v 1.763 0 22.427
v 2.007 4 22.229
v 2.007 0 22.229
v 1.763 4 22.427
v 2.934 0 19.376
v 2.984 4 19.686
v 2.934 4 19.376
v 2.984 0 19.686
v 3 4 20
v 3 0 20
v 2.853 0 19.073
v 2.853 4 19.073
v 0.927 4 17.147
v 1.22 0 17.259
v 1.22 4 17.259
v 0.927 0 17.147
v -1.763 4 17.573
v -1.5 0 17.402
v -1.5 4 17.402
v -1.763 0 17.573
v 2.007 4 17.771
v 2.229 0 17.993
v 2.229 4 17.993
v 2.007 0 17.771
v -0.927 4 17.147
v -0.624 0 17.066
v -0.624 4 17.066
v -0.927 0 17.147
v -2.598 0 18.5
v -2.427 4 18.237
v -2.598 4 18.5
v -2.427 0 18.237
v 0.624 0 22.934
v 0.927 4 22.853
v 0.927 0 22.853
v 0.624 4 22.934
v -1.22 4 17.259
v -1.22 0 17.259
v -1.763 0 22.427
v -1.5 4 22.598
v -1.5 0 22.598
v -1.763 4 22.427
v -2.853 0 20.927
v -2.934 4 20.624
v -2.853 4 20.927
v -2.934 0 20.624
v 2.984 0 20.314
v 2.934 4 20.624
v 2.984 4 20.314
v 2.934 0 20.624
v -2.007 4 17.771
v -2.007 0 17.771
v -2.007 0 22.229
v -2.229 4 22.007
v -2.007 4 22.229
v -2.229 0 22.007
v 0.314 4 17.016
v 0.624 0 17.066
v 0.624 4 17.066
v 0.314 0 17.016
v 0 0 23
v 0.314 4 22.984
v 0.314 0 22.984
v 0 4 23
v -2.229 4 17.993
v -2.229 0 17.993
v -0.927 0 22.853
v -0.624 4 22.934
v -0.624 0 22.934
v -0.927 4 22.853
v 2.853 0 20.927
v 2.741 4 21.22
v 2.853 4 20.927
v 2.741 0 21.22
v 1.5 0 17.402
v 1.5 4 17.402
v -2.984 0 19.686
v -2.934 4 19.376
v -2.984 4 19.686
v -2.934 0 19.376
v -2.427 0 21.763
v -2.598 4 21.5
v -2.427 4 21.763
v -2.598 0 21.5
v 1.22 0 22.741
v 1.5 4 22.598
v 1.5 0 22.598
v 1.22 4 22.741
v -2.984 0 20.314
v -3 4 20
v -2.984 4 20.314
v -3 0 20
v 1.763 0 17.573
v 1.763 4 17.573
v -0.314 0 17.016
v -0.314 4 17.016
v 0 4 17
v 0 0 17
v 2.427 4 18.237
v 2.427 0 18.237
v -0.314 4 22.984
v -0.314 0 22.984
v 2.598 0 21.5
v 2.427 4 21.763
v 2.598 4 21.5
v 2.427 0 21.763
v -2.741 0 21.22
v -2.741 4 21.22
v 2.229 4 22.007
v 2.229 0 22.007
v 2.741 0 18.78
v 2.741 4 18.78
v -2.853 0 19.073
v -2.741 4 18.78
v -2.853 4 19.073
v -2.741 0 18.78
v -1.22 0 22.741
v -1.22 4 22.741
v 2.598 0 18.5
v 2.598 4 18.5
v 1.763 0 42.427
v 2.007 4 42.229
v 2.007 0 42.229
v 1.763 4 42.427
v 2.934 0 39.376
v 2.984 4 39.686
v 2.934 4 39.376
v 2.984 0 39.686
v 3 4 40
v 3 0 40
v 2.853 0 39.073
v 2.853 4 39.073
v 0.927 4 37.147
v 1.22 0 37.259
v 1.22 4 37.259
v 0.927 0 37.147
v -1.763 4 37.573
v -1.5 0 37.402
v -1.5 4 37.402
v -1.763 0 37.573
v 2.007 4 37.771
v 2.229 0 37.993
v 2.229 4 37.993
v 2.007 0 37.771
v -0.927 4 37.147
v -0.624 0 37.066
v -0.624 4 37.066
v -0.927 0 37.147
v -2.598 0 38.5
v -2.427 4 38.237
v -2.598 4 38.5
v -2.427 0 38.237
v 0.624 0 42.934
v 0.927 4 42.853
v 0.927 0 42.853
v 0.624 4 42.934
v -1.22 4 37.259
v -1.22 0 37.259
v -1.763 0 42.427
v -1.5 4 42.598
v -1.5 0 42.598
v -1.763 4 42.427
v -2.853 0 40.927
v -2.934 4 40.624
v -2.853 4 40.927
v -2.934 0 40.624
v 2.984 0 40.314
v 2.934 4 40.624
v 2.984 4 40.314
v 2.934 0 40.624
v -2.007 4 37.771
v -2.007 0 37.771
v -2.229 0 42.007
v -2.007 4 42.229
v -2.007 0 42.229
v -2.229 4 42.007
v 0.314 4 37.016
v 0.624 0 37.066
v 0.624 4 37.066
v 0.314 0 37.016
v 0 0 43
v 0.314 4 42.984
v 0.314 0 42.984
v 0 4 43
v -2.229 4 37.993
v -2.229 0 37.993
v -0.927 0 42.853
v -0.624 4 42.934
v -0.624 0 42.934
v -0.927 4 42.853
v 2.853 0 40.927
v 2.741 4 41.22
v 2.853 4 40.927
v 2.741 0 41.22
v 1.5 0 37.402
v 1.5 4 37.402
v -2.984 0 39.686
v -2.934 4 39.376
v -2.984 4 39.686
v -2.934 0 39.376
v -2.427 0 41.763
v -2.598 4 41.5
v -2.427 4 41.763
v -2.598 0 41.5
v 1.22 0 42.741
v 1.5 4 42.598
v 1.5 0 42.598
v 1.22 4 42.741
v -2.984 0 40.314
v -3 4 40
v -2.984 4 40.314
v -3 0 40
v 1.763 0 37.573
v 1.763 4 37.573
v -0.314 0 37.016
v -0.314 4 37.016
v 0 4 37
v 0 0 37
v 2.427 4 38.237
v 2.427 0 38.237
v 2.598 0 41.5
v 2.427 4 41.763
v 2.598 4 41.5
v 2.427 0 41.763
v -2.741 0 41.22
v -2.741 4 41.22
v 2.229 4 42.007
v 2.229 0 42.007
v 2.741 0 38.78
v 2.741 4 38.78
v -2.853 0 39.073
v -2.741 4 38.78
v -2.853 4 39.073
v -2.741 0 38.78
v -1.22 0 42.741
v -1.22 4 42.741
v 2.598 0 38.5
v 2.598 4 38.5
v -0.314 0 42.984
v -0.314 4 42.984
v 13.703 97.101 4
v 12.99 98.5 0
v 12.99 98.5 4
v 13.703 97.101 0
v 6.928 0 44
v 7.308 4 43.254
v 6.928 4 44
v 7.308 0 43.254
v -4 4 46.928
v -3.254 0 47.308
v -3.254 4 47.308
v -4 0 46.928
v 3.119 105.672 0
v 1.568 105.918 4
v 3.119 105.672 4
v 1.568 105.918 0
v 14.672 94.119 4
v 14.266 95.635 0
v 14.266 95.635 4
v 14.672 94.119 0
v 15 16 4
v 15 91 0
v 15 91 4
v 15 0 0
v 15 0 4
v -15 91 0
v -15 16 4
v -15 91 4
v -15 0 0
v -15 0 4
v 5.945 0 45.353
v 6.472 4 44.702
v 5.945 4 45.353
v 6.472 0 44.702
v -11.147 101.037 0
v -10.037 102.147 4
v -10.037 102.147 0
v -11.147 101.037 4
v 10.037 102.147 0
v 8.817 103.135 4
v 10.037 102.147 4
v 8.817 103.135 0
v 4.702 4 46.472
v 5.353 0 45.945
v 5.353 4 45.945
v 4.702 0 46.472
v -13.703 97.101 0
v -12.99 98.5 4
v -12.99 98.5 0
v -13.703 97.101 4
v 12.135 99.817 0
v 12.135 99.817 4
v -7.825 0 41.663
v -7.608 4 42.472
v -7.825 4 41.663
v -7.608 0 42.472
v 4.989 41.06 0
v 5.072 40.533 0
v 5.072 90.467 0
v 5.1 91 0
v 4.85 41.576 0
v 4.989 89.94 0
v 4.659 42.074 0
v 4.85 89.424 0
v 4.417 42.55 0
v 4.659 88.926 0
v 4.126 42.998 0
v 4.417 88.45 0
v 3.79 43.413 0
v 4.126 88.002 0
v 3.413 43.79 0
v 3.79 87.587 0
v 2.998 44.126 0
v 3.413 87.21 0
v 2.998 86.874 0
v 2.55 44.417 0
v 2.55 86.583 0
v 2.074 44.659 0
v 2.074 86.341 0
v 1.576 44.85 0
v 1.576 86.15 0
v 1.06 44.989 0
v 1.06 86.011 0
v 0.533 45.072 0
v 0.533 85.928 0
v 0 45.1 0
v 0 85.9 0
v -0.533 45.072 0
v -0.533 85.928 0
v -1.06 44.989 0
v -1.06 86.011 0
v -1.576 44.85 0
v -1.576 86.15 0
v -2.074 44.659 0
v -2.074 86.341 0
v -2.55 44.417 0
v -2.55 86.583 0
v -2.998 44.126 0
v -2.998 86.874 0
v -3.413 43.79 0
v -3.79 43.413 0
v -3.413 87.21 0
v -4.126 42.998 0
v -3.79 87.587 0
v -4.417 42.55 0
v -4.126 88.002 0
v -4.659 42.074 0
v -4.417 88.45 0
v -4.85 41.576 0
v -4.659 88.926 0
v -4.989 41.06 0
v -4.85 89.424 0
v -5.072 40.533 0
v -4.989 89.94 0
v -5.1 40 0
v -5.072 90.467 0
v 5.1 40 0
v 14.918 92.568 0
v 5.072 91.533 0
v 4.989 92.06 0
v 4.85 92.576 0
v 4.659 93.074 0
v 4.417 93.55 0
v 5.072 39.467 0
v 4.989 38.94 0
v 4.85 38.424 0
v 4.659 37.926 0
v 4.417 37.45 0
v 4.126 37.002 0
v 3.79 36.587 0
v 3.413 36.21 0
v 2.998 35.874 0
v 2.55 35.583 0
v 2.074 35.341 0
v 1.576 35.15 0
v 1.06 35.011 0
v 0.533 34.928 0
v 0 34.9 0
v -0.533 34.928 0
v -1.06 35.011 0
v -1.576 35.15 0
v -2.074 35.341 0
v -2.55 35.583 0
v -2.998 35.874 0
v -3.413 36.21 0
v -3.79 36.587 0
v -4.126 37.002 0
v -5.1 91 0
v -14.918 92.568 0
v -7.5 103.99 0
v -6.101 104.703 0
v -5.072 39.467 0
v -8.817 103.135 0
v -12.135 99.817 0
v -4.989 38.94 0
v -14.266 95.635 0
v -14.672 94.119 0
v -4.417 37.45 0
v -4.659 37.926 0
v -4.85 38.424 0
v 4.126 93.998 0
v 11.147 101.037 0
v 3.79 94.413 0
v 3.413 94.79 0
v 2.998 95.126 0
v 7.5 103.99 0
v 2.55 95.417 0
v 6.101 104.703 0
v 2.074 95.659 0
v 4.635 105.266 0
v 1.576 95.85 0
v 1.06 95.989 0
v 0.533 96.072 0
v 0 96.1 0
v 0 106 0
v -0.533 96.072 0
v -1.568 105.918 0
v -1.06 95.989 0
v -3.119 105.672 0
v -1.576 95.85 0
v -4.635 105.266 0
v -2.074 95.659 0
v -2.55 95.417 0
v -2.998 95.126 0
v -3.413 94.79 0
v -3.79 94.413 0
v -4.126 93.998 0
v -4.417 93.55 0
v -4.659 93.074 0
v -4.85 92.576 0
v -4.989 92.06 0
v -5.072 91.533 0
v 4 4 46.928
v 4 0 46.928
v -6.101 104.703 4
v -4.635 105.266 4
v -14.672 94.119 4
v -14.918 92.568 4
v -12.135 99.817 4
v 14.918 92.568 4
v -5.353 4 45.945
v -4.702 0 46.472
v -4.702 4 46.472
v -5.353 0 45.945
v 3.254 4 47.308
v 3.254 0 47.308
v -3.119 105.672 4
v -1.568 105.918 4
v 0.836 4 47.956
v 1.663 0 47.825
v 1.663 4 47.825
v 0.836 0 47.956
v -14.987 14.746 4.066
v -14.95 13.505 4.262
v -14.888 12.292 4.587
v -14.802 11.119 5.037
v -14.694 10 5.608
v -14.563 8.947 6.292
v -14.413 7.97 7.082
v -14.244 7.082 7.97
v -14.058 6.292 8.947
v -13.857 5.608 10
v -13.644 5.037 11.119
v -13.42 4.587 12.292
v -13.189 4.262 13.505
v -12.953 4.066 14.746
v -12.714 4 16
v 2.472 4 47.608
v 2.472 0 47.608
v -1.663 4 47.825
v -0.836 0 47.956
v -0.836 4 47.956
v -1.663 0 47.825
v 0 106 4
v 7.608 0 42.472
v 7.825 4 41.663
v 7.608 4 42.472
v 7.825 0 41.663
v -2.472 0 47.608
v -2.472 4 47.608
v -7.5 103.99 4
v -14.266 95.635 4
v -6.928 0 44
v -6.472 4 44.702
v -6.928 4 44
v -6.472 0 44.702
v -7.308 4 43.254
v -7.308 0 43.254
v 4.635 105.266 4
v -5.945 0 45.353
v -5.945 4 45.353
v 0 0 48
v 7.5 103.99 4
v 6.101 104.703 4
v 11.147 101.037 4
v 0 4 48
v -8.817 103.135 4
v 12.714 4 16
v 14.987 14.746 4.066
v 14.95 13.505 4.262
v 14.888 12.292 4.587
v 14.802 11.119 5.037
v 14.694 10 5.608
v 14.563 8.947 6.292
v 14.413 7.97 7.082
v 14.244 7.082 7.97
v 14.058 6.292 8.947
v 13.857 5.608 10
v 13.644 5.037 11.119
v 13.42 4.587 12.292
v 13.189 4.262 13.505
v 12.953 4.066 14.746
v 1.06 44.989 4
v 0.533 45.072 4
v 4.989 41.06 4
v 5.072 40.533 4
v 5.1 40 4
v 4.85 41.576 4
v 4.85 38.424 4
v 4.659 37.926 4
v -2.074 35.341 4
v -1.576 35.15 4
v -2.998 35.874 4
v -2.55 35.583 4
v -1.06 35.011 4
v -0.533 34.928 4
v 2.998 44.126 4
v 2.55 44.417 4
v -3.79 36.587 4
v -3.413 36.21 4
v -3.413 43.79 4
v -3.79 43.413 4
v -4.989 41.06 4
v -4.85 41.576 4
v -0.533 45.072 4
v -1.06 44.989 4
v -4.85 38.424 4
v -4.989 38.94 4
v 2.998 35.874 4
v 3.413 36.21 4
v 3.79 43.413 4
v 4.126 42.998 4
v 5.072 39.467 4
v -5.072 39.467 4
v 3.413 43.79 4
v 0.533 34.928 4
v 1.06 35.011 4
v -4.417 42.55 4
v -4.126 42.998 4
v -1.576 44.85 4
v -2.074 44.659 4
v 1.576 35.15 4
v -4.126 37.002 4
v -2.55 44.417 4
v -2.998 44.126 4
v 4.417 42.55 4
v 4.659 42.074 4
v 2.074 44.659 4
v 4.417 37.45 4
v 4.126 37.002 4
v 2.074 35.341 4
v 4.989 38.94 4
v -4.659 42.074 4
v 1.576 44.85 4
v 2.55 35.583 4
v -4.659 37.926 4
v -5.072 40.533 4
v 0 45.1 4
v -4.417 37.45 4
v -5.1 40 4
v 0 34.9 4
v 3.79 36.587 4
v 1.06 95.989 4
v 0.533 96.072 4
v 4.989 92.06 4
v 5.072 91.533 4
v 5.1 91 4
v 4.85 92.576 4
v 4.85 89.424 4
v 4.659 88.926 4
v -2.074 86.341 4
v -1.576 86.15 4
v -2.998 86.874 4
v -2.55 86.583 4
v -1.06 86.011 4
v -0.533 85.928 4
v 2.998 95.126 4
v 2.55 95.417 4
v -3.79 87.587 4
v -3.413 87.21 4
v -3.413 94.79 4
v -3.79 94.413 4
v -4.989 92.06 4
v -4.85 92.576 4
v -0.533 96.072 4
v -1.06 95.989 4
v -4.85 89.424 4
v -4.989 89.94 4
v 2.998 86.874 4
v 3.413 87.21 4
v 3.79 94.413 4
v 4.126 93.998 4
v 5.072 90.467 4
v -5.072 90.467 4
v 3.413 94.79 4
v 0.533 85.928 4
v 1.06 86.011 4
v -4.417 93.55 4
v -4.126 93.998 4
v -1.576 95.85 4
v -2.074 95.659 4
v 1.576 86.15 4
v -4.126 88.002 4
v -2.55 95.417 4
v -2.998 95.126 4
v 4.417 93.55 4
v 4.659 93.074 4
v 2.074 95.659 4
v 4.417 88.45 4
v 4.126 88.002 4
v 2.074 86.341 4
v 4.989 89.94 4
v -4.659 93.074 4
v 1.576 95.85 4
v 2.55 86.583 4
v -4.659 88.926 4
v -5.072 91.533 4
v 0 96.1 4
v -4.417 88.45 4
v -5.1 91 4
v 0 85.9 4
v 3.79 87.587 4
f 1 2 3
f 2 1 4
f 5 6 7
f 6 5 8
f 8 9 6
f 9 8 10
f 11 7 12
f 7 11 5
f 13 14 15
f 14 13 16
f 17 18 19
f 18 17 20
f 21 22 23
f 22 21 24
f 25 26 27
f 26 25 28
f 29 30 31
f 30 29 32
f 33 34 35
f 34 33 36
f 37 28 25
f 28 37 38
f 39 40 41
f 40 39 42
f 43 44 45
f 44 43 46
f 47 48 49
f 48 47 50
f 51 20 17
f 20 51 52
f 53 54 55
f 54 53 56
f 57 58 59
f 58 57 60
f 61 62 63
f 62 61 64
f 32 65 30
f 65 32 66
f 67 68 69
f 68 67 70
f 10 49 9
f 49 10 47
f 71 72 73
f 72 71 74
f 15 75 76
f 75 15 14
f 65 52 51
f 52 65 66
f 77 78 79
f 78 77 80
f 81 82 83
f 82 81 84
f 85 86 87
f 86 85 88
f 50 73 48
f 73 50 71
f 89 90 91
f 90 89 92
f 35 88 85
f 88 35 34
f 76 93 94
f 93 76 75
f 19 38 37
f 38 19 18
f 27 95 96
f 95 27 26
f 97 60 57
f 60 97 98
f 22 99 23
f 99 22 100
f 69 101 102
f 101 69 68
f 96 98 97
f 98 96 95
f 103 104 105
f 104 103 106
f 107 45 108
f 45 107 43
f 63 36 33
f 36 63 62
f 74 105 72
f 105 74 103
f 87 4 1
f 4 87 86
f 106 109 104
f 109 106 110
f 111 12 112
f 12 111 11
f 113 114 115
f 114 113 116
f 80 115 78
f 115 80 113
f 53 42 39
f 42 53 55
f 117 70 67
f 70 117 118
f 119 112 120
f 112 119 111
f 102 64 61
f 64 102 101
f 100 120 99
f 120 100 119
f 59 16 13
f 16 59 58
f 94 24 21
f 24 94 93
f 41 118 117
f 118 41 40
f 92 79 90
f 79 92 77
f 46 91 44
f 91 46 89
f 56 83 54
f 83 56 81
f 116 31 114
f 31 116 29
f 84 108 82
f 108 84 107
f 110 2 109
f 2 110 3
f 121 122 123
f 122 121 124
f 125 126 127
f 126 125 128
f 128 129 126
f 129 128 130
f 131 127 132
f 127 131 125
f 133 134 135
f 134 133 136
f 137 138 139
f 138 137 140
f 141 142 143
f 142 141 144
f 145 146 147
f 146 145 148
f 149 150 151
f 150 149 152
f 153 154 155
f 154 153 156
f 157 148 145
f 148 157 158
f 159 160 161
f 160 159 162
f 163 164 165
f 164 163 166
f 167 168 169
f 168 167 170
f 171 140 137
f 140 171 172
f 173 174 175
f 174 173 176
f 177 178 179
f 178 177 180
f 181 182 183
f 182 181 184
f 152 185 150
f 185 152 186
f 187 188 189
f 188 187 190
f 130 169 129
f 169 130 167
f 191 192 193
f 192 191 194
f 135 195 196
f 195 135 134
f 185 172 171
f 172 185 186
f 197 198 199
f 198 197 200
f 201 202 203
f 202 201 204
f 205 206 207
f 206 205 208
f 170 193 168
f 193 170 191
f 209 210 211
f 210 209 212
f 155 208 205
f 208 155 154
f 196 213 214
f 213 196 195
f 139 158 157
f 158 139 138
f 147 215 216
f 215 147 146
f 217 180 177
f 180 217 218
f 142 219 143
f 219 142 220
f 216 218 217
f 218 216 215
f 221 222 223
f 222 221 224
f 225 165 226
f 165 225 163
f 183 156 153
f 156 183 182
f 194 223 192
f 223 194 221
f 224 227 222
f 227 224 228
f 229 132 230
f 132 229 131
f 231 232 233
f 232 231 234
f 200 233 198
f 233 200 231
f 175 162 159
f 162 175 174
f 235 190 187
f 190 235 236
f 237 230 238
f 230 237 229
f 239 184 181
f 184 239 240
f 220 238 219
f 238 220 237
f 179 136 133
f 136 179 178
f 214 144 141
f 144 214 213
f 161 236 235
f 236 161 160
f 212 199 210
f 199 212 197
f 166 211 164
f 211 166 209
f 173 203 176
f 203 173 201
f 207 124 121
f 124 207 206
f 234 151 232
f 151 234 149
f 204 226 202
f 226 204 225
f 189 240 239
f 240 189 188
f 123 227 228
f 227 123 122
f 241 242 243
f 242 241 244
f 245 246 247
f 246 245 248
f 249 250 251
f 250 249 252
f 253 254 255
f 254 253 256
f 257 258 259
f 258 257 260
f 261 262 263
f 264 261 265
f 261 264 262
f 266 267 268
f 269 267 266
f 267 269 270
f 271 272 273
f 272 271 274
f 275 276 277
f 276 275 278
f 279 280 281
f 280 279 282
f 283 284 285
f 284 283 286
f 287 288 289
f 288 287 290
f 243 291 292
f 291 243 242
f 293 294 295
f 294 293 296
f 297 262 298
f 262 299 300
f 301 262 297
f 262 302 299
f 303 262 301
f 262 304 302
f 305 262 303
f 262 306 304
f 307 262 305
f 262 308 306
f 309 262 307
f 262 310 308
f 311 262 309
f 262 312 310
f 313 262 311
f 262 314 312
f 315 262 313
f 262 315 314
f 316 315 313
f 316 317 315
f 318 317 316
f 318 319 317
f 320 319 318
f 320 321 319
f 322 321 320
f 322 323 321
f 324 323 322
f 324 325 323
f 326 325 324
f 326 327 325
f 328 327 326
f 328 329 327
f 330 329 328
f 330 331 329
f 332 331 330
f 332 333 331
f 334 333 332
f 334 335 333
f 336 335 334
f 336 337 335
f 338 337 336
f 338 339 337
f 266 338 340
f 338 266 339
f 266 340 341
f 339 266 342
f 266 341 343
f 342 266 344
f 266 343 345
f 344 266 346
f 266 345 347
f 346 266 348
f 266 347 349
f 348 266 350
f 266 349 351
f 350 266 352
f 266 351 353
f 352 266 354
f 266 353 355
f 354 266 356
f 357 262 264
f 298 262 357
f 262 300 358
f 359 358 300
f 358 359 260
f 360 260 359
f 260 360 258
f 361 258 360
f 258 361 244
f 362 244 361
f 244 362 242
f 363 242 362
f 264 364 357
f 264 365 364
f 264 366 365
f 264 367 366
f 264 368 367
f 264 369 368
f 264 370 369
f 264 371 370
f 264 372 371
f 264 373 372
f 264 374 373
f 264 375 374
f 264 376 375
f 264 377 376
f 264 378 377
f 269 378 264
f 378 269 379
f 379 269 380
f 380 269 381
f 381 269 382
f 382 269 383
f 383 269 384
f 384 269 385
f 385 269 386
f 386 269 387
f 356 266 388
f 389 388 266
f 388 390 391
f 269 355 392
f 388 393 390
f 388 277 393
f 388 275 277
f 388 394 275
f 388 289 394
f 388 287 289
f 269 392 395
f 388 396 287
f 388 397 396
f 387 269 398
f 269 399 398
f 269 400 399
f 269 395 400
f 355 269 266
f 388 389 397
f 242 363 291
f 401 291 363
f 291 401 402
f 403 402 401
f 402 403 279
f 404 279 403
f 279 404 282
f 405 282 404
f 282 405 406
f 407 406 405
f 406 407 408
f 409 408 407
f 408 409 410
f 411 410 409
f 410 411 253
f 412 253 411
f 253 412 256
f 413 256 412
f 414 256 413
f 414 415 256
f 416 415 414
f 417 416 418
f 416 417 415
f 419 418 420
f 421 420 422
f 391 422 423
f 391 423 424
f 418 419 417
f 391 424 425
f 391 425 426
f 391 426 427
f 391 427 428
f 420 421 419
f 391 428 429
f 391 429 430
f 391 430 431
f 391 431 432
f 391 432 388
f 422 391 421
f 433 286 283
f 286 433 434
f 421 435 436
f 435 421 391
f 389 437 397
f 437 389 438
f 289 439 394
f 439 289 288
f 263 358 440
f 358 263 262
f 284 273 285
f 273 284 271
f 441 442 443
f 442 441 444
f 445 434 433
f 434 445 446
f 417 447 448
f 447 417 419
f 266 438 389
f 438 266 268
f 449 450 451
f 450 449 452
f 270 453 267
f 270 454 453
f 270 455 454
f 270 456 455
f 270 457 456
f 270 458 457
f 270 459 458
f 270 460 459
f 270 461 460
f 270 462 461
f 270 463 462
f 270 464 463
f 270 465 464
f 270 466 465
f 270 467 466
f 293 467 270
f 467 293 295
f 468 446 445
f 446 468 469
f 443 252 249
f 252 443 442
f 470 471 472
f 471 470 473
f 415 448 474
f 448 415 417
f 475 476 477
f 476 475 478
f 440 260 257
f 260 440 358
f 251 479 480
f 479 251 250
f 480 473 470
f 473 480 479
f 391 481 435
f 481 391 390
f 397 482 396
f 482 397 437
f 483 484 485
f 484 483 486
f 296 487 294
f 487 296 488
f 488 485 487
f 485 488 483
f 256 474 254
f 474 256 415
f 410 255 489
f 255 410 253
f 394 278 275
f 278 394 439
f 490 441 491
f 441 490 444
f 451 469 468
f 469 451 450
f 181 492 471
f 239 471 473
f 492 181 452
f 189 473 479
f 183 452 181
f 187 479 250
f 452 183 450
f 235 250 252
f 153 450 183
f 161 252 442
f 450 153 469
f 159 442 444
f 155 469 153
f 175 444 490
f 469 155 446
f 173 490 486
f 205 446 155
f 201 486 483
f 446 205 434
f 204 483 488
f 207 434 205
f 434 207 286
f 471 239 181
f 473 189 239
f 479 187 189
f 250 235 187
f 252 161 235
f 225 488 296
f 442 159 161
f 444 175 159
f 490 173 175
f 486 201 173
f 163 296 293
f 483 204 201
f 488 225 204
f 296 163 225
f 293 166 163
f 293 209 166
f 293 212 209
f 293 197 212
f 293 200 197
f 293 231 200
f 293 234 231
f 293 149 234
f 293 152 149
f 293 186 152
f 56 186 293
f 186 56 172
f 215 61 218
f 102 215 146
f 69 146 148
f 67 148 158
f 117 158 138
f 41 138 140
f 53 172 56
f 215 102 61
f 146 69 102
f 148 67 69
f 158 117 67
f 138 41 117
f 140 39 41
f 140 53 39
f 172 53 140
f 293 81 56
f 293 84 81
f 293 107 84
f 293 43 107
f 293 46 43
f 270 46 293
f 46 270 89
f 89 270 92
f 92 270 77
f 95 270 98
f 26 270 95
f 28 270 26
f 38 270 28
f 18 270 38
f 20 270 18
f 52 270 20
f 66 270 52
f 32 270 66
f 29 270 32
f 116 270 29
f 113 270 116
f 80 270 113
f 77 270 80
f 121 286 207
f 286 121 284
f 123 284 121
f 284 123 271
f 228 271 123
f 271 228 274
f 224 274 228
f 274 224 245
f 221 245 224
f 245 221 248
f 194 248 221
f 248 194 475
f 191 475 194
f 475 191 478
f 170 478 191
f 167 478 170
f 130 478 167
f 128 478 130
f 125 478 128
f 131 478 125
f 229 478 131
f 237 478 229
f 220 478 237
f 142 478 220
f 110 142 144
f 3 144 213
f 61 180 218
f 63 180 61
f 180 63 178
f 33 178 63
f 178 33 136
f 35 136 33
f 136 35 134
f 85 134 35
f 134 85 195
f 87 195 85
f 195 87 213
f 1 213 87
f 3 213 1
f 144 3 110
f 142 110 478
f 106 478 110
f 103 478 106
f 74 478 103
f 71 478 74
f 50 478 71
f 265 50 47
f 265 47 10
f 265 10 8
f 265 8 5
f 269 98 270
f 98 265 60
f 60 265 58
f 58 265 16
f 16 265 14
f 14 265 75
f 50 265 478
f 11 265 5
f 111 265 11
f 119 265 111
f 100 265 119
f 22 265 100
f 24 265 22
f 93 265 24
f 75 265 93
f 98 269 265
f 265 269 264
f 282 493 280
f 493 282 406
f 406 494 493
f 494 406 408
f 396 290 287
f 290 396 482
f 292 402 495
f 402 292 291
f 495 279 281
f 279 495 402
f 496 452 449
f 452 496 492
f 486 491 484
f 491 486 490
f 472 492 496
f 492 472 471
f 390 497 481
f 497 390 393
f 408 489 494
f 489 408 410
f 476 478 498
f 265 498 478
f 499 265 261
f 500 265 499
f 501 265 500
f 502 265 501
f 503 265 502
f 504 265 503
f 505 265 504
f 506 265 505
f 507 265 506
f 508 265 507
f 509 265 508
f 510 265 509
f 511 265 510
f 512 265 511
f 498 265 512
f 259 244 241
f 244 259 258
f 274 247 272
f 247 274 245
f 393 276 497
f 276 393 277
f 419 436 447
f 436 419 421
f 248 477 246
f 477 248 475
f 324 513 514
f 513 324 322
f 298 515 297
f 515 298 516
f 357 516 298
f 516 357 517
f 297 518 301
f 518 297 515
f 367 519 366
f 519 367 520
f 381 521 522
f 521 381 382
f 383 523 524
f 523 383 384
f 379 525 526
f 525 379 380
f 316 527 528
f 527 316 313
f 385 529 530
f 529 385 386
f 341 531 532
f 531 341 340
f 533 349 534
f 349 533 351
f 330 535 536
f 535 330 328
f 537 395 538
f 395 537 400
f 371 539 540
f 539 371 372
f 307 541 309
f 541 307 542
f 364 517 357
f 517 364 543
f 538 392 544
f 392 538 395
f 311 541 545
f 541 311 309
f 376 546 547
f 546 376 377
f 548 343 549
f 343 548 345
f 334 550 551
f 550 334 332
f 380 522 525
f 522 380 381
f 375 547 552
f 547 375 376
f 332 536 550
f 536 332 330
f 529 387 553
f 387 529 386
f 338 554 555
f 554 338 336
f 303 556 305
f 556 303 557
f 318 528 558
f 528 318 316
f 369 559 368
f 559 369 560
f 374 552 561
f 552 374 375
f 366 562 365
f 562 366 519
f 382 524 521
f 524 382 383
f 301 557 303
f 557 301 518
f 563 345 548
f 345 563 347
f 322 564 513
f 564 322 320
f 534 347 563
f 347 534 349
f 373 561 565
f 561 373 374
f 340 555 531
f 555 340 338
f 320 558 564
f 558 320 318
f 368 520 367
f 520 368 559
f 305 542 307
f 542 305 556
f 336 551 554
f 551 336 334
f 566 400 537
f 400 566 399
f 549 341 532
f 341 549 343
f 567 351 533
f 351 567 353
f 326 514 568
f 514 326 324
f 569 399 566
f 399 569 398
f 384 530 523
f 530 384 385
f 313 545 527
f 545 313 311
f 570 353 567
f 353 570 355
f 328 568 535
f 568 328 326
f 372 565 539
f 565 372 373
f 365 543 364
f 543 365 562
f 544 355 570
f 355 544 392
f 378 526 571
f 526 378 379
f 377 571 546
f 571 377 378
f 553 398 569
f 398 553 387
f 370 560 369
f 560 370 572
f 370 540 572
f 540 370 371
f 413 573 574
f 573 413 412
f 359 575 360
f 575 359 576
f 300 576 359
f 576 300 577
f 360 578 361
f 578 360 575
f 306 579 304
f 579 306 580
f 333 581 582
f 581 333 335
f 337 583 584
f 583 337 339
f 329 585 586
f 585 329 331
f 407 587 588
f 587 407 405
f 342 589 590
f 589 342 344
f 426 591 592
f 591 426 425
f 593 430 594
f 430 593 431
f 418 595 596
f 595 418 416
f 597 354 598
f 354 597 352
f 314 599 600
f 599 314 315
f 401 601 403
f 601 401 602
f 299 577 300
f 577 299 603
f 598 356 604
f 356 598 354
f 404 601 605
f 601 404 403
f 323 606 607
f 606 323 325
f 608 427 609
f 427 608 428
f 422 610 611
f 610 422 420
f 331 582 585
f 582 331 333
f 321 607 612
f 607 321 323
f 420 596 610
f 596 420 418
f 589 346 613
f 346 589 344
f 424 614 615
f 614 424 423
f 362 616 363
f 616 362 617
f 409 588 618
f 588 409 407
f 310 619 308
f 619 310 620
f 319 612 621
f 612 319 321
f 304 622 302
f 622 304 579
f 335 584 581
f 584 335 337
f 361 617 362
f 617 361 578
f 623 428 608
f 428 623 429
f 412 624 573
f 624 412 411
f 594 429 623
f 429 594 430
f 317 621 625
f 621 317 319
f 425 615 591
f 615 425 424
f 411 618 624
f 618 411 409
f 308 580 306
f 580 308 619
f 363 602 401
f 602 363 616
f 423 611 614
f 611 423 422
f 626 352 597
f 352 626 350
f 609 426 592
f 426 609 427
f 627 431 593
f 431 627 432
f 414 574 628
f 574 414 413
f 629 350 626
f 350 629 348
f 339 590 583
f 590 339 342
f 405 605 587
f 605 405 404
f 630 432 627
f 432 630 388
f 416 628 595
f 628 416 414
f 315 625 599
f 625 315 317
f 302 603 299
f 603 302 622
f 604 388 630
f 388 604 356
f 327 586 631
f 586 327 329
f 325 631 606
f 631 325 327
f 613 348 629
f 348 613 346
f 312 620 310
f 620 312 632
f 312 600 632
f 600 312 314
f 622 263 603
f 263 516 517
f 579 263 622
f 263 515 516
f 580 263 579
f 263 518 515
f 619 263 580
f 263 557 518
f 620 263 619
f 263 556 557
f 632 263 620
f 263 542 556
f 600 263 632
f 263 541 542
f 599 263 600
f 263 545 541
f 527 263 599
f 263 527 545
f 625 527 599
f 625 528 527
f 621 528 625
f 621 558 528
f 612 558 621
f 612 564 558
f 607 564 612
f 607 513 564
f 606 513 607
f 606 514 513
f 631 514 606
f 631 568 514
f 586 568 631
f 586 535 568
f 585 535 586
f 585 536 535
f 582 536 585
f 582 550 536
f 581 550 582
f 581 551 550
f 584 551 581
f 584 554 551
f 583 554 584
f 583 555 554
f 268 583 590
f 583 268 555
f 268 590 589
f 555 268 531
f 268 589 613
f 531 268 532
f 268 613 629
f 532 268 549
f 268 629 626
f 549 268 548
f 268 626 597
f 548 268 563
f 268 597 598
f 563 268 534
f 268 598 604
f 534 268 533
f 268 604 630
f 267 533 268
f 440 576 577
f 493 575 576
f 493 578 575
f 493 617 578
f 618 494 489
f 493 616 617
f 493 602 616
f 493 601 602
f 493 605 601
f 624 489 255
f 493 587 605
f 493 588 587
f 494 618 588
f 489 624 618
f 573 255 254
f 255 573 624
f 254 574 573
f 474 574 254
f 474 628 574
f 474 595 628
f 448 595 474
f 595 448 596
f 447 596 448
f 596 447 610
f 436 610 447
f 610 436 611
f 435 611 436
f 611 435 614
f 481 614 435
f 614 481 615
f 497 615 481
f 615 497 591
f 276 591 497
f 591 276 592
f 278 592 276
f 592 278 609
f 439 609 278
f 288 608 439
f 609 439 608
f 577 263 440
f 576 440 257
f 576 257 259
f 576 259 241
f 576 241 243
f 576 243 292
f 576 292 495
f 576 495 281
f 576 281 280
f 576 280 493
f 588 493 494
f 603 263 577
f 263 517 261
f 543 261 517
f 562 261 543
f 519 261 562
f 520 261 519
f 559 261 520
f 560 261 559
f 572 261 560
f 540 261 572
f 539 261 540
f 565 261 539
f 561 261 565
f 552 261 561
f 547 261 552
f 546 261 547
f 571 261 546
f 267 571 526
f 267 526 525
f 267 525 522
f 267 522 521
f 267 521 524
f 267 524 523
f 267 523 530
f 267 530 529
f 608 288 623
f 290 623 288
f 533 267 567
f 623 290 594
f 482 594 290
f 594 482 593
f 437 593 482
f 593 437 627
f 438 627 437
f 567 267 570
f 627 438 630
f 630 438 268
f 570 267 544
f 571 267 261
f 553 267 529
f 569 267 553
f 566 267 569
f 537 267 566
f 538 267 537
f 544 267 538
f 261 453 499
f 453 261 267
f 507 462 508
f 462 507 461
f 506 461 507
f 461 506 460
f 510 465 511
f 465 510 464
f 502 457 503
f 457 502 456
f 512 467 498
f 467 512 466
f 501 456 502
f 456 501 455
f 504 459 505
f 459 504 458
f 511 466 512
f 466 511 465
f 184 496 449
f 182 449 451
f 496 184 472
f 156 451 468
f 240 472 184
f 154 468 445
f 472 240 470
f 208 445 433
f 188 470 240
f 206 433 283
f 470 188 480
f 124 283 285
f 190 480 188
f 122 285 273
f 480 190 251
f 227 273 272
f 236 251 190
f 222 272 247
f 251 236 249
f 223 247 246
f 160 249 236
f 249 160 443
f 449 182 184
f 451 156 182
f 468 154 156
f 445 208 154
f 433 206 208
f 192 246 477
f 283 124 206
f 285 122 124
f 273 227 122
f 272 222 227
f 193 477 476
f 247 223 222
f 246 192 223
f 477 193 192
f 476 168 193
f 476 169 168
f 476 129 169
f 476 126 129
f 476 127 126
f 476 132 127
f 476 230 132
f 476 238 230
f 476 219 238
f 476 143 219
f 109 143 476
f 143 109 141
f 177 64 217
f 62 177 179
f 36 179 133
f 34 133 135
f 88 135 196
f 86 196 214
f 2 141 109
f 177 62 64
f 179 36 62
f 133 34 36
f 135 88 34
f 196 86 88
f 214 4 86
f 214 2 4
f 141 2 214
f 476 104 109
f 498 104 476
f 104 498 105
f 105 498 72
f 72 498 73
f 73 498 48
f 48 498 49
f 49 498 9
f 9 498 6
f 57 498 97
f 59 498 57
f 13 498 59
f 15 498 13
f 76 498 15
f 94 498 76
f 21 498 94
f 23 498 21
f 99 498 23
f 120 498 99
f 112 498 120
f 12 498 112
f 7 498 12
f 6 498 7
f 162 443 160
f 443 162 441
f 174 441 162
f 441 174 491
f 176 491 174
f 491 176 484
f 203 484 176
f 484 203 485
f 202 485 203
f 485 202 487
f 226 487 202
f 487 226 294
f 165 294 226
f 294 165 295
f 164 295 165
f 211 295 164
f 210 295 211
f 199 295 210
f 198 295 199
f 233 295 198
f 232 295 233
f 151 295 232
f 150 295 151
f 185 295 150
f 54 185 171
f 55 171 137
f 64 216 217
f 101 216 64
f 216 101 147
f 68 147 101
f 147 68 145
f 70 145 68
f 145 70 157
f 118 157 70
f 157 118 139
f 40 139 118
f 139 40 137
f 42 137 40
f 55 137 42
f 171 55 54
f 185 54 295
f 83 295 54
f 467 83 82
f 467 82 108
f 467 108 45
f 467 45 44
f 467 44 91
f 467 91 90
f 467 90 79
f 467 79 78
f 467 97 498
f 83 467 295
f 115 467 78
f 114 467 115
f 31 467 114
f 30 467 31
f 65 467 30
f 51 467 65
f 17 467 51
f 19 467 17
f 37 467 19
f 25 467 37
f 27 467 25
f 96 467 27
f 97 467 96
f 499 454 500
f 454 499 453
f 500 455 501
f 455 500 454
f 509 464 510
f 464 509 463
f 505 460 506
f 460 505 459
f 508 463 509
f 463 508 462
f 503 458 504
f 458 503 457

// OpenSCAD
bolt=10;
bolt_gap=51;
bolt_wall=10;
bolt_total=bolt+bolt_wall*2;
bolt_to_wall=40;
thick=4;
pad=0.1;
padd=pad*2;

screw=6;
screw_wall=5;
screw_total=screw_wall*2+screw;
screw_gap=20;
screws=2;

r=12;
$fn=60;


difference() {
    hull() {
        hull() {
            translate([0,0,screws*screw_gap])
            rotate([-90,0,0])
            cylinder(h=thick,d=screw_total);
            translate([-bolt_total/2,0,0])
            cube([bolt_total,thick,thick]);
        }
        hull() {
            translate([0,bolt_to_wall+bolt_gap,0])
            cylinder(h=thick,d=bolt_total);
            translate([-bolt_total/2,0,0])
            cube([bolt_total,thick,thick]);
        }
    }
    for(z=[screw_gap:screw_gap:screw_gap*screws]) { 
        translate([0,-pad,z])
        rotate([-90,0,0])
        cylinder(h=thick+padd,d=screw);
    }
    translate([0,bolt_to_wall,-pad])
    cylinder(h=thick+padd,d=bolt+padd);
    translate([0,bolt_to_wall+bolt_gap,-pad])
    cylinder(h=thick+padd,d=bolt+padd);

    translate([-bolt_total/2,thick+r,thick+r])
    minkowski() {
        cube([bolt_total,bolt_total+bolt_to_wall+bolt_gap,screws*screw_gap+screw_total]);
        rotate([0,90,0])
        cylinder(r=r,h=padd);
    }
}
